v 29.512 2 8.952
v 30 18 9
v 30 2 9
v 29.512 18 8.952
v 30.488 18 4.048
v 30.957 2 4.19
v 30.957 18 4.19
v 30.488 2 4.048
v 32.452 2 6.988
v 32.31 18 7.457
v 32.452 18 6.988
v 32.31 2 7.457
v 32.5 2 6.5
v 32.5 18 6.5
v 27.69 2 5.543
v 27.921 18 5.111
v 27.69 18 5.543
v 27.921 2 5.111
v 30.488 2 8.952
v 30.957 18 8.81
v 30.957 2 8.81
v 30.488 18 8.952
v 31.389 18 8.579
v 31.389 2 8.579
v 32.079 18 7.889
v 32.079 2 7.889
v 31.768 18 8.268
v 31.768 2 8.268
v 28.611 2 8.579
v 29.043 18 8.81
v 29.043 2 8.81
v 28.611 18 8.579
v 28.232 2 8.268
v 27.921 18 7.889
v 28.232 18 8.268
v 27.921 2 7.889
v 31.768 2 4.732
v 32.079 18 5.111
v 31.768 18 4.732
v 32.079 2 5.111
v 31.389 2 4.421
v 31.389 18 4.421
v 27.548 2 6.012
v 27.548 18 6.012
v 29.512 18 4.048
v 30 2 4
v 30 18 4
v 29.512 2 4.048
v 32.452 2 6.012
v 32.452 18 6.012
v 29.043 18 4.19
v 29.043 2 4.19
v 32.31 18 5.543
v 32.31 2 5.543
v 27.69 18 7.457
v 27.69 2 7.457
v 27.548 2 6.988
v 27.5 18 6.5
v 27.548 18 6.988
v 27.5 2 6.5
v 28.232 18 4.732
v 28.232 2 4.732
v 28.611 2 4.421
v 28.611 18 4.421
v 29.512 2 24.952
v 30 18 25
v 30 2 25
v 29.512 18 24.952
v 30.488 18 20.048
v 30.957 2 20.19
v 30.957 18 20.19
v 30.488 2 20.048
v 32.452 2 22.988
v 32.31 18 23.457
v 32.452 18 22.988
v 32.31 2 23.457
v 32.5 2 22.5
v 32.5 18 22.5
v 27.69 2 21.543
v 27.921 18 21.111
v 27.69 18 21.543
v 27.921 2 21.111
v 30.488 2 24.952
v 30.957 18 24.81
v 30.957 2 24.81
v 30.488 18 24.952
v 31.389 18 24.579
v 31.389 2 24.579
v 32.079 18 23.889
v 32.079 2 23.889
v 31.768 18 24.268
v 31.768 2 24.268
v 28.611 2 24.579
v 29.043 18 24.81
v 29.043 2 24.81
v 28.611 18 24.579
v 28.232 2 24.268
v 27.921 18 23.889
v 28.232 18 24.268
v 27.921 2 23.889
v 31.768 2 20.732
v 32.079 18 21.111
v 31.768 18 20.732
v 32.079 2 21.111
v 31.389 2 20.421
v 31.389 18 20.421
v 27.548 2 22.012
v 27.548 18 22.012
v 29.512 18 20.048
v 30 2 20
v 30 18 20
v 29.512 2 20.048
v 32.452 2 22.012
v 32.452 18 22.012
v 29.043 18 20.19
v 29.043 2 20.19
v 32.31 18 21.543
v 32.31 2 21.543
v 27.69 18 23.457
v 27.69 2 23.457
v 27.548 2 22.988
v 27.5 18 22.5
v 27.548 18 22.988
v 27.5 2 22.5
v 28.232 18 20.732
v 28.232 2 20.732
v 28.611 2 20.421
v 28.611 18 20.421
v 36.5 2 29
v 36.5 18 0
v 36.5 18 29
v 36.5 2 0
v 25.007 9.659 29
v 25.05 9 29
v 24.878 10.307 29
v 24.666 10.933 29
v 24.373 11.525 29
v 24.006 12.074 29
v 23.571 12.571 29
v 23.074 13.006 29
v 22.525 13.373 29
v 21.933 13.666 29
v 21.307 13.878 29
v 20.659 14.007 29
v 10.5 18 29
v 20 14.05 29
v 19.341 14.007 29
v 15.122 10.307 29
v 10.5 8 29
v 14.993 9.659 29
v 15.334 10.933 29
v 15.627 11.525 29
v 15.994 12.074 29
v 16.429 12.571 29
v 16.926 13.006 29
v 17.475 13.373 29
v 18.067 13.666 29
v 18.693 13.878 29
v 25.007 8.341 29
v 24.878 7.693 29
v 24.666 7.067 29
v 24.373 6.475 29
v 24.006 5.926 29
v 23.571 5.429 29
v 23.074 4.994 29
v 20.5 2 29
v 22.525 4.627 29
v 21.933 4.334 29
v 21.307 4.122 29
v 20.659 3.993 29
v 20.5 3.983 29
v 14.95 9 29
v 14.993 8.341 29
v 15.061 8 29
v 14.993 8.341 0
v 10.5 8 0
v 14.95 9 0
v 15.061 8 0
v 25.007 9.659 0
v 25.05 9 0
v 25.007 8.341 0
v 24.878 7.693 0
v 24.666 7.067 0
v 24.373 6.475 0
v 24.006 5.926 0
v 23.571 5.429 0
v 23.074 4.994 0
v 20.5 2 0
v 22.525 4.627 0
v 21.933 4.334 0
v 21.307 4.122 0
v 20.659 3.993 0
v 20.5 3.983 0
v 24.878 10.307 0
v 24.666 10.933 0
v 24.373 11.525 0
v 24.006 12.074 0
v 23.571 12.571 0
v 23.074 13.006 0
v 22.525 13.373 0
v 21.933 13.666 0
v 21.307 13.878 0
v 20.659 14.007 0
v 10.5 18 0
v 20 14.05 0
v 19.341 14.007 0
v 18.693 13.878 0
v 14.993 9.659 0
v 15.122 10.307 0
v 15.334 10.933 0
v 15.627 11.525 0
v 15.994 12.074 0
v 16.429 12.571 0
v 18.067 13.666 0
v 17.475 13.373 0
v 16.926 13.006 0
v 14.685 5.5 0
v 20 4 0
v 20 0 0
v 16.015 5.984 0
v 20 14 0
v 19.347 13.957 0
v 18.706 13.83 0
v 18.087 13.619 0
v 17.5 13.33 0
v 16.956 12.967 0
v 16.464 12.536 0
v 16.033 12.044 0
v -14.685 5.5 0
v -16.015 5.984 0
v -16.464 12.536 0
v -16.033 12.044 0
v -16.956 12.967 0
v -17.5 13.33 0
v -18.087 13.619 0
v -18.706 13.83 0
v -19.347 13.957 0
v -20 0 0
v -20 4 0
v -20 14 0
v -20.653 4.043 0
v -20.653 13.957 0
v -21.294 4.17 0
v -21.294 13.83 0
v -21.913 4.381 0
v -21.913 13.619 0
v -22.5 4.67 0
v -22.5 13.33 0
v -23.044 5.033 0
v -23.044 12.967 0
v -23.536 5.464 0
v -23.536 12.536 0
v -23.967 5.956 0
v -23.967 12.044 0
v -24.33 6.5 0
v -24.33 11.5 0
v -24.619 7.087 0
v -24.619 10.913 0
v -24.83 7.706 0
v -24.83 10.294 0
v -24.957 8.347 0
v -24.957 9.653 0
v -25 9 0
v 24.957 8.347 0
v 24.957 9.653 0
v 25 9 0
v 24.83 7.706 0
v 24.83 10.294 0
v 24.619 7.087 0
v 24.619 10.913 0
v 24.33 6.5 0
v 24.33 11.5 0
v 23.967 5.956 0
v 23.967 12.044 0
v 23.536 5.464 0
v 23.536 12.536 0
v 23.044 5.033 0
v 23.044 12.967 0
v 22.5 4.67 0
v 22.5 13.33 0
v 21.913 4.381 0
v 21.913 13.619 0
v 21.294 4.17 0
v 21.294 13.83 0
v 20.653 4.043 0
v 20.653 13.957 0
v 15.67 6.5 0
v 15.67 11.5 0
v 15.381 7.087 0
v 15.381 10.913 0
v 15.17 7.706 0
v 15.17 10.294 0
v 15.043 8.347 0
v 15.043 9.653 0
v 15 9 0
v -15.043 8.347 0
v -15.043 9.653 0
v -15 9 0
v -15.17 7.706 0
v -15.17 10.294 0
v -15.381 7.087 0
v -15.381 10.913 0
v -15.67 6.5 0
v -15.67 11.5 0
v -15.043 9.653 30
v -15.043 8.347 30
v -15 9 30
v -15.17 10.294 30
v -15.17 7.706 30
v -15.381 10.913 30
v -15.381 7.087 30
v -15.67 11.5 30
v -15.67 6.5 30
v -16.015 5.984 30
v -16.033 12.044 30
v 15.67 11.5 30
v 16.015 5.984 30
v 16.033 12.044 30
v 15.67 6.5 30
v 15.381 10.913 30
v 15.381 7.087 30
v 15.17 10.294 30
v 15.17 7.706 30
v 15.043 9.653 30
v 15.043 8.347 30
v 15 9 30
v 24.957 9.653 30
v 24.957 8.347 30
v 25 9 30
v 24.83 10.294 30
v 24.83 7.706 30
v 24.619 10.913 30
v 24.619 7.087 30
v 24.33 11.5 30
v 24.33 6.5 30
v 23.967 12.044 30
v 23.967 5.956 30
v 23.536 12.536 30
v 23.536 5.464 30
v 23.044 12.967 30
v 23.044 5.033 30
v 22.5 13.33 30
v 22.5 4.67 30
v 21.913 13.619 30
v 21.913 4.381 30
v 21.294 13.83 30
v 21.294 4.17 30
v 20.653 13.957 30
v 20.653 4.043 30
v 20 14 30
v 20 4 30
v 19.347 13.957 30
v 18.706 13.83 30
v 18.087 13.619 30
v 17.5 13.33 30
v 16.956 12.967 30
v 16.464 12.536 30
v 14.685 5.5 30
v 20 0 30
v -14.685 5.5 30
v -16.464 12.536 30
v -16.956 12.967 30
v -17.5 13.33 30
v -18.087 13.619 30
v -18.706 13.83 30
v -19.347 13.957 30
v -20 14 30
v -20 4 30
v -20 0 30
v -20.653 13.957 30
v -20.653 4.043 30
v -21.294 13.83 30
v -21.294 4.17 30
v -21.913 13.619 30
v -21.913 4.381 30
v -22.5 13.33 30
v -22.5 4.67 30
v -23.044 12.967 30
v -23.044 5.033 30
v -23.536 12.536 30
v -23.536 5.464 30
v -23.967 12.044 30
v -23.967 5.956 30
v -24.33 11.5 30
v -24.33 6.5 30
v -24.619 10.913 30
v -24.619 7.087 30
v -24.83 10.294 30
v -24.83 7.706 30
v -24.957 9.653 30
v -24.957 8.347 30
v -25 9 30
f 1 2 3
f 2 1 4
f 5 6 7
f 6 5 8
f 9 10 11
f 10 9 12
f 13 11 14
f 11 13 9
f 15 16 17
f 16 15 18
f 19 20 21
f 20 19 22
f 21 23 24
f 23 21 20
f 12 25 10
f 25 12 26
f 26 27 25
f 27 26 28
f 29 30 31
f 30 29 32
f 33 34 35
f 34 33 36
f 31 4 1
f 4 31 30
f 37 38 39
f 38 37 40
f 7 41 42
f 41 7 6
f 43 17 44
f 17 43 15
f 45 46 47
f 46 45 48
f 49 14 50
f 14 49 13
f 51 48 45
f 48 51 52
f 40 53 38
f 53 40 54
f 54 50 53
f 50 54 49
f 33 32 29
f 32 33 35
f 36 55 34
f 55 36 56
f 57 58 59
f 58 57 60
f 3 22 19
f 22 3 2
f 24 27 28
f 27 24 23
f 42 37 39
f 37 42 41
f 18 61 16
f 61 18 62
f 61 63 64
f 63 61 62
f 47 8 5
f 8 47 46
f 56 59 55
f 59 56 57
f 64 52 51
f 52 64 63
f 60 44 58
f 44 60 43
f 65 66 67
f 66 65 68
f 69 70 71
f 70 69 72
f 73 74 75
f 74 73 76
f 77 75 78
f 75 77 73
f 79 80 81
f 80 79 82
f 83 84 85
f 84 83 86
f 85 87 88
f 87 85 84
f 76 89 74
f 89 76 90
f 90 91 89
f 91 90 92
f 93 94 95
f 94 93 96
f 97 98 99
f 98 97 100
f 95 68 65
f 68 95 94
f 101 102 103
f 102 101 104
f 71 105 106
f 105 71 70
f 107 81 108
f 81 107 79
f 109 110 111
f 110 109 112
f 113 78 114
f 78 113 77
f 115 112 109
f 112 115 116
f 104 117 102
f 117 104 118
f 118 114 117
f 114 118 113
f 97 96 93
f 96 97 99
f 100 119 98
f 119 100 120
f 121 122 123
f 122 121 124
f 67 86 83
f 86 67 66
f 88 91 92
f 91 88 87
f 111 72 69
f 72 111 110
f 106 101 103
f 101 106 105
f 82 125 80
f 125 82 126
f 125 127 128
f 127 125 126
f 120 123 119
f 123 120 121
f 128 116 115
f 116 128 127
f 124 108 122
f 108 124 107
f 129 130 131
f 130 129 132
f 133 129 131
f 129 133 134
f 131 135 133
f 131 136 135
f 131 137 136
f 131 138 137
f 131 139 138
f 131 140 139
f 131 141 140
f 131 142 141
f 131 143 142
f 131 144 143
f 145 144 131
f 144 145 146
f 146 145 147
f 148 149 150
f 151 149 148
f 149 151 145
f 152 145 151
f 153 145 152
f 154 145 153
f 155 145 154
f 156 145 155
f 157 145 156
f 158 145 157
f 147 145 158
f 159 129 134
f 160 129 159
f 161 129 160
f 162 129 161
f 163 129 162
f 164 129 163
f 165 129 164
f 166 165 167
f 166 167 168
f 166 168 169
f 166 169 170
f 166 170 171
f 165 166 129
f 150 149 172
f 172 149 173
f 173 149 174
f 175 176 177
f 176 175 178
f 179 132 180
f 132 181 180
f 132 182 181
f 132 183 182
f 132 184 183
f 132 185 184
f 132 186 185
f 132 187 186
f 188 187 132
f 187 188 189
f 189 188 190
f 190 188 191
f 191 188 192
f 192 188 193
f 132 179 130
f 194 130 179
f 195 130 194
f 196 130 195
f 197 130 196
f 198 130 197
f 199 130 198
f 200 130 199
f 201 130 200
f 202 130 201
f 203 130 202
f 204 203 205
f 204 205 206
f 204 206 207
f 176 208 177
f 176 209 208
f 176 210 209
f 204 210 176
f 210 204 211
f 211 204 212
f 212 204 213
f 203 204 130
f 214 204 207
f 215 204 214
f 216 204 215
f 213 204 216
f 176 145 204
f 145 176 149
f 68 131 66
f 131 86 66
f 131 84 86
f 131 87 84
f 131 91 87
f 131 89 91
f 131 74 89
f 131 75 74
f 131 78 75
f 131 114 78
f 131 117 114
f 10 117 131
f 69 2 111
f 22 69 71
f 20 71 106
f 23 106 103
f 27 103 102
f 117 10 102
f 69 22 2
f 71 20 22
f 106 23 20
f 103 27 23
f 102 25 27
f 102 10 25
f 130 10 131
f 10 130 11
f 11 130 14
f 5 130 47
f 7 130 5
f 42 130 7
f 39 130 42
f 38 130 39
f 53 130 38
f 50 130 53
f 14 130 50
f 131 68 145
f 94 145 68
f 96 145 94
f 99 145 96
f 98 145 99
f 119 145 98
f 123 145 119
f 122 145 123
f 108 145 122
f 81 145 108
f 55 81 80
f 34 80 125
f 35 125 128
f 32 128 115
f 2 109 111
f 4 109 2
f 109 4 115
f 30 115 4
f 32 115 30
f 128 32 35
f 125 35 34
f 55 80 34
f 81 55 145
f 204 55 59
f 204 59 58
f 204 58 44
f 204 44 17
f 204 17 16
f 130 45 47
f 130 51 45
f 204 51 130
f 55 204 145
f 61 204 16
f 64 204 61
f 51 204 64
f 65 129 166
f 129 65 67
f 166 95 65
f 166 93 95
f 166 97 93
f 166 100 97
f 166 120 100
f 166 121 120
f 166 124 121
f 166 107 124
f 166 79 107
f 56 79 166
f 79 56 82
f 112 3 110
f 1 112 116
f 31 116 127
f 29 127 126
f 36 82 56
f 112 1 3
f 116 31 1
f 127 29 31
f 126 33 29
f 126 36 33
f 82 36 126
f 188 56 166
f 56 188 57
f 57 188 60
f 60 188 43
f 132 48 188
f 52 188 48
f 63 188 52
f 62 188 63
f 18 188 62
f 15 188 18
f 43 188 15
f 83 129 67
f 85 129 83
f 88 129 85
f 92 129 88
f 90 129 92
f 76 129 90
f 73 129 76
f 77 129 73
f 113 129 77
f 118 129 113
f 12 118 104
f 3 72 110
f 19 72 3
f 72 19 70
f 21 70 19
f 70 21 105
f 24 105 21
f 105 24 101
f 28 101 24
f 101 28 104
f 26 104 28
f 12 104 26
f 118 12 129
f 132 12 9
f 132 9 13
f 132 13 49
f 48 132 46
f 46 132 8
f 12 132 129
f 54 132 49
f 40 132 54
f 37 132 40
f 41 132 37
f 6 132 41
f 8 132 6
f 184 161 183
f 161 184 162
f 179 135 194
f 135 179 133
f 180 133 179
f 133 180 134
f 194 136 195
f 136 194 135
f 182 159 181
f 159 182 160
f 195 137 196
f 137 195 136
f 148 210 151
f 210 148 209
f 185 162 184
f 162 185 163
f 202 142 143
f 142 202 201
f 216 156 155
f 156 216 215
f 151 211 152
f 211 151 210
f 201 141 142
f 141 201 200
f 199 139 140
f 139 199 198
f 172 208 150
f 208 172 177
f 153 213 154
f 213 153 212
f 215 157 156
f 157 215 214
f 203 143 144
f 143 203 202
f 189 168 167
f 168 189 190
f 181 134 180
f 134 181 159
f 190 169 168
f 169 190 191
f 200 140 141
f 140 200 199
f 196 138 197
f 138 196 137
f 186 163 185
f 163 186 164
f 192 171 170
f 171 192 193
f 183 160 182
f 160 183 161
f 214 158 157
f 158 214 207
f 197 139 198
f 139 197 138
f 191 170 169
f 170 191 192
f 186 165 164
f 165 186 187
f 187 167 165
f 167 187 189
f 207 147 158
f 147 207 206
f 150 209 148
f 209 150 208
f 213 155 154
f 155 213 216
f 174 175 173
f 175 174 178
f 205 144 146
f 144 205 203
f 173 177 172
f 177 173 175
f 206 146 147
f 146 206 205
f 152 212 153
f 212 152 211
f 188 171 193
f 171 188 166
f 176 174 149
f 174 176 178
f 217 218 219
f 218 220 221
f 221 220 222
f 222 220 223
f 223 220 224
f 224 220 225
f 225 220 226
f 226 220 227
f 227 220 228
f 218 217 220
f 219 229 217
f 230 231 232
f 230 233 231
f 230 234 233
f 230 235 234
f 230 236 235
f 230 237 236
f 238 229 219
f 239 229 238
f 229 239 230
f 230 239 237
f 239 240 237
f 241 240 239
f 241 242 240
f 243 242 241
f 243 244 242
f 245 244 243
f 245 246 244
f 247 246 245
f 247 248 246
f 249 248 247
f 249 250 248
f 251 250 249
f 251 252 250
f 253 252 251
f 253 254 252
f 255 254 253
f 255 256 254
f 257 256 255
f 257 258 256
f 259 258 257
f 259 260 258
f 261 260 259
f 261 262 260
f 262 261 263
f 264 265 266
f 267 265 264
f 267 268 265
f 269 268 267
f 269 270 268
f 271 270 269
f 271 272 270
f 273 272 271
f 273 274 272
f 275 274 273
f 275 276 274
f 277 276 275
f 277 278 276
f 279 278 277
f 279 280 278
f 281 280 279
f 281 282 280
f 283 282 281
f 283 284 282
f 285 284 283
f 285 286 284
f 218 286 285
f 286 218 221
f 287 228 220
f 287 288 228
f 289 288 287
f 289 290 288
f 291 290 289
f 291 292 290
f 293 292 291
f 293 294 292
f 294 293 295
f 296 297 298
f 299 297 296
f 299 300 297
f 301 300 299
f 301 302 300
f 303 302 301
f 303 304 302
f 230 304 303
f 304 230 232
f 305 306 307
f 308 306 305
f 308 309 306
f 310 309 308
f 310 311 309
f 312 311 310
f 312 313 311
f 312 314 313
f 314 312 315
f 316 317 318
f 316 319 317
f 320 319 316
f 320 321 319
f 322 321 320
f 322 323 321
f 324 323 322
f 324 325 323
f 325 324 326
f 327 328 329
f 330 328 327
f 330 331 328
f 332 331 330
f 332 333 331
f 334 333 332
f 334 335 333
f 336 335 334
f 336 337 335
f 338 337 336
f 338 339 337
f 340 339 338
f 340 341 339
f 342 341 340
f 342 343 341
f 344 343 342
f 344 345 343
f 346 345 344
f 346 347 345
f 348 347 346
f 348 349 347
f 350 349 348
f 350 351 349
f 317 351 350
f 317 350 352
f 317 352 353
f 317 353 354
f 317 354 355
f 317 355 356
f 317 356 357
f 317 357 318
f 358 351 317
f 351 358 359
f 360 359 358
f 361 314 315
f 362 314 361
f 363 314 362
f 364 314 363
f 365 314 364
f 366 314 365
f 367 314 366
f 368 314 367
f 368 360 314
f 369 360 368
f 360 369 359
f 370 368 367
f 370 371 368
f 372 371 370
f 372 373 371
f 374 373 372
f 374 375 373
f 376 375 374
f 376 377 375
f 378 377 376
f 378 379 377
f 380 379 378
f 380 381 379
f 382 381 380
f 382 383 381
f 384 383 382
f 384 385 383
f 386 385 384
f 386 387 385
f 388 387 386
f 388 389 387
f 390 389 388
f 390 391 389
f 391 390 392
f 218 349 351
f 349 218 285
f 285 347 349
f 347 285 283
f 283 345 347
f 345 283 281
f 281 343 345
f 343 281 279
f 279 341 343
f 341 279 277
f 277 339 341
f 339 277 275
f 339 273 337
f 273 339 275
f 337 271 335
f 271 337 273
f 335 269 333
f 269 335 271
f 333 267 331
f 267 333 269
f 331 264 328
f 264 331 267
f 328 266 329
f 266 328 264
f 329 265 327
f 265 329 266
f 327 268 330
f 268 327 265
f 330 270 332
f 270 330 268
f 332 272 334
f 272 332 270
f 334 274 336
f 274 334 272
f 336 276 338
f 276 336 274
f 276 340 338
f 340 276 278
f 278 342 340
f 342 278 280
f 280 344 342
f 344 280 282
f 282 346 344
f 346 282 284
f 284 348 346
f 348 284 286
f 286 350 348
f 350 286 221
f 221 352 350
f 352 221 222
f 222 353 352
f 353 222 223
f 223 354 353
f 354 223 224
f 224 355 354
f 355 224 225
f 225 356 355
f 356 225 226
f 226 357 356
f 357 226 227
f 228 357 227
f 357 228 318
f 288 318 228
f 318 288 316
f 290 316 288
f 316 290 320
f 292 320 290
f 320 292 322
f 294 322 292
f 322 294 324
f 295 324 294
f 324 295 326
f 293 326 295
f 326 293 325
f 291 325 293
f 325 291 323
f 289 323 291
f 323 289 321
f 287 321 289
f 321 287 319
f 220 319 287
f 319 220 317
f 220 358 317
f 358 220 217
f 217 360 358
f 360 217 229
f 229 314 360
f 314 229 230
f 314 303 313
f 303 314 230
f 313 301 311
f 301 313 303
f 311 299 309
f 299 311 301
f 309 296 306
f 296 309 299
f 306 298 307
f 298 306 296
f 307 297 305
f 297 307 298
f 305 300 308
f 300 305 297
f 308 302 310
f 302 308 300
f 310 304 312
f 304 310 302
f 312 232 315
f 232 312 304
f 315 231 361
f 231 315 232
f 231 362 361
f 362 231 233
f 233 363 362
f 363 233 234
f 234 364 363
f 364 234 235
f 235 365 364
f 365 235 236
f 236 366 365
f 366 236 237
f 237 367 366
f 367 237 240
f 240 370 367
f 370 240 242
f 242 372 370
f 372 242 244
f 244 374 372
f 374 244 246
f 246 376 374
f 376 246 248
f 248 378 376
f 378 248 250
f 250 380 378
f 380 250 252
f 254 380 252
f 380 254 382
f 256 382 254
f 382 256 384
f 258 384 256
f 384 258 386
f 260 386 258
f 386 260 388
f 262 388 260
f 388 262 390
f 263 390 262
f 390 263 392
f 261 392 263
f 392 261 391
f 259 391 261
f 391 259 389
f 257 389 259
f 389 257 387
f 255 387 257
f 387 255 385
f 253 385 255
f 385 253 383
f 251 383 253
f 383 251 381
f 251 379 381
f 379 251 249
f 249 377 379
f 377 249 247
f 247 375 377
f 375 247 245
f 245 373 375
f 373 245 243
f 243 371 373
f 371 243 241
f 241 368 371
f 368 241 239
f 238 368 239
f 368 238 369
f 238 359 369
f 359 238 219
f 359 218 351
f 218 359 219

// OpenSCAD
module profileI5(l) {
    color("Silver") render(convexity=8) linear_extrude(height=l, convexity=8) {
        difference() {
            union() {
                for(i=[-1, 1]) {
                    for(j=[-1, 1]) {
                        translate([i*8, j*8, 0]) circle(d=4, $fn=12);
                        translate([i*(10-1.58/2), j*(2.5+5.5/2), 0]) square([1.58, 5.5], center=true);
                        translate([i*(2.5+5.5/2), j*(10-1.58/2), 0]) square([5.5, 1.58], center=true);
                        translate([i*(5.55+1.5/2), j*(10-1.58-1.5/3), 0]) square([1.5, 1.5], center=true);
                        translate([i*(10-1.58-1.5/3), j*(5.55+1.5/2), 0]) square([1.5, 1.5], center=true);
                    }
                    rotate([0, 0, i*45]) square([20, 1.5], center=true);
                }
                square([2*(10-6.35), 2*(10-6.35)], center=true);
            }
            circle(d=4.3, $fn=16);
            for(i=[-1, 1]) {
                for(j=[-1, 1]) {
                    translate([i*5.55, j*(10-1.58-1.5/2), 0]) circle(d=1.5, $fn=8);
                    translate([i*(10-1.58-1.5/2), j*5.55, 0]) circle(d=1.5, $fn=8);
                }
            }
        }
    }
}

module profileI5double(l) {
    color("Silver") render(convexity=8) linear_extrude(height=l, convexity=8) {
        difference() {
            union() {
                for(i=[-1, 1]) {
                    for(j=[-1, 1]) {
                        translate([i*8, j*18+10, 0]) circle(d=4, $fn=12);
                        translate([i*(10-1.58/2), j*(2.5+5.5/2), 0]) square([1.58, 5.5], center=true);
                        translate([i*(10-1.58/2), j*(2.5+5.5/2)+20, 0]) square([1.58, 5.5], center=true);
                        translate([i*(2.5+5.5/2), j*(20-1.58/2)+10, 0]) square([5.5, 1.58], center=true);
                        translate([i*(5.55+1.5/2), j*(20-1.58-1.5/3)+10, 0]) square([1.5, 1.5], center=true);
                        translate([i*(10-1.58-1.5/3), j*(5.55+1.5/2), 0]) square([1.5, 1.5], center=true);
                        translate([i*(10-1.58-1.5/3), j*(5.55+1.5/2)+20, 0]) square([1.5, 1.5], center=true);
                        translate([0, j*10+10, 0]) rotate([0, 0, i*45]) square([26, 1.5], center=true);
                        translate([0, j*10+10, 0]) square([2*(10-6.35), 2*(10-6.35)], center=true);
                        translate([i*8.5, j*2.5+10, 0]) square([2, 2], center=true);
                    }
                    translate([i*9.2, 10, 0]) square([1.6, 7], center=true);
                }
                
            }
            for(i=[-1, 1]) {
                translate([0, i*10+10, 0]) circle(d=4.3, $fn=16);
                translate([i*7.883, 10, 0]) circle(d=1.5, $fn=16);
                for(j=[-1, 1]) {
                    for(k=[0, 20]) {
                        translate([i*5.55, j*(10-1.58-1.5/2)+k, 0]) circle(d=1.5, $fn=8);
                        translate([i*(10-1.58-1.5/2), j*5.55+k, 0]) circle(d=1.5, $fn=8);
                    }
                }
            }
        }
    }
}

module DrylinWS4010(l) {
    color("Silver") render(convexity=8) linear_extrude(height=l, convexity=8) {
        for(i=[-1, 1]) {
            translate([i*20, 9, 0]) circle(d=10, $fn=48);
            translate([i*16.5, 3.5, 0]) rotate([0, 0, i*20]) square([5, 5], center=true);
        }
        translate([0, 5.5/2, 0]) square([40, 5.5], center=true);
    }
}

module Drylin10slider() {
    color("Silver") render(convexity=4) difference() {
        translate([30+6.5-26, 2, 0]) cube([26, 16, 29]);
        translate([20, 9, -1]) cylinder(d=10.1, h=31, $fn=48);
        for(i=[-1, 1]) {
            translate([30, 19, 29/2+i*8]) rotate([90, 0, 0]) cylinder(d=5, h=18, $fn=32);
        }
        translate([-5.5, -8, -1]) cube([26, 16, 31]);
    }
}

Drylin10slider();
DrylinWS4010(30);
//profileI5double(15);
//translate([0, 0, -5]) profileI5(4);
//translate([0, 20, -5]) profileI5(5);
